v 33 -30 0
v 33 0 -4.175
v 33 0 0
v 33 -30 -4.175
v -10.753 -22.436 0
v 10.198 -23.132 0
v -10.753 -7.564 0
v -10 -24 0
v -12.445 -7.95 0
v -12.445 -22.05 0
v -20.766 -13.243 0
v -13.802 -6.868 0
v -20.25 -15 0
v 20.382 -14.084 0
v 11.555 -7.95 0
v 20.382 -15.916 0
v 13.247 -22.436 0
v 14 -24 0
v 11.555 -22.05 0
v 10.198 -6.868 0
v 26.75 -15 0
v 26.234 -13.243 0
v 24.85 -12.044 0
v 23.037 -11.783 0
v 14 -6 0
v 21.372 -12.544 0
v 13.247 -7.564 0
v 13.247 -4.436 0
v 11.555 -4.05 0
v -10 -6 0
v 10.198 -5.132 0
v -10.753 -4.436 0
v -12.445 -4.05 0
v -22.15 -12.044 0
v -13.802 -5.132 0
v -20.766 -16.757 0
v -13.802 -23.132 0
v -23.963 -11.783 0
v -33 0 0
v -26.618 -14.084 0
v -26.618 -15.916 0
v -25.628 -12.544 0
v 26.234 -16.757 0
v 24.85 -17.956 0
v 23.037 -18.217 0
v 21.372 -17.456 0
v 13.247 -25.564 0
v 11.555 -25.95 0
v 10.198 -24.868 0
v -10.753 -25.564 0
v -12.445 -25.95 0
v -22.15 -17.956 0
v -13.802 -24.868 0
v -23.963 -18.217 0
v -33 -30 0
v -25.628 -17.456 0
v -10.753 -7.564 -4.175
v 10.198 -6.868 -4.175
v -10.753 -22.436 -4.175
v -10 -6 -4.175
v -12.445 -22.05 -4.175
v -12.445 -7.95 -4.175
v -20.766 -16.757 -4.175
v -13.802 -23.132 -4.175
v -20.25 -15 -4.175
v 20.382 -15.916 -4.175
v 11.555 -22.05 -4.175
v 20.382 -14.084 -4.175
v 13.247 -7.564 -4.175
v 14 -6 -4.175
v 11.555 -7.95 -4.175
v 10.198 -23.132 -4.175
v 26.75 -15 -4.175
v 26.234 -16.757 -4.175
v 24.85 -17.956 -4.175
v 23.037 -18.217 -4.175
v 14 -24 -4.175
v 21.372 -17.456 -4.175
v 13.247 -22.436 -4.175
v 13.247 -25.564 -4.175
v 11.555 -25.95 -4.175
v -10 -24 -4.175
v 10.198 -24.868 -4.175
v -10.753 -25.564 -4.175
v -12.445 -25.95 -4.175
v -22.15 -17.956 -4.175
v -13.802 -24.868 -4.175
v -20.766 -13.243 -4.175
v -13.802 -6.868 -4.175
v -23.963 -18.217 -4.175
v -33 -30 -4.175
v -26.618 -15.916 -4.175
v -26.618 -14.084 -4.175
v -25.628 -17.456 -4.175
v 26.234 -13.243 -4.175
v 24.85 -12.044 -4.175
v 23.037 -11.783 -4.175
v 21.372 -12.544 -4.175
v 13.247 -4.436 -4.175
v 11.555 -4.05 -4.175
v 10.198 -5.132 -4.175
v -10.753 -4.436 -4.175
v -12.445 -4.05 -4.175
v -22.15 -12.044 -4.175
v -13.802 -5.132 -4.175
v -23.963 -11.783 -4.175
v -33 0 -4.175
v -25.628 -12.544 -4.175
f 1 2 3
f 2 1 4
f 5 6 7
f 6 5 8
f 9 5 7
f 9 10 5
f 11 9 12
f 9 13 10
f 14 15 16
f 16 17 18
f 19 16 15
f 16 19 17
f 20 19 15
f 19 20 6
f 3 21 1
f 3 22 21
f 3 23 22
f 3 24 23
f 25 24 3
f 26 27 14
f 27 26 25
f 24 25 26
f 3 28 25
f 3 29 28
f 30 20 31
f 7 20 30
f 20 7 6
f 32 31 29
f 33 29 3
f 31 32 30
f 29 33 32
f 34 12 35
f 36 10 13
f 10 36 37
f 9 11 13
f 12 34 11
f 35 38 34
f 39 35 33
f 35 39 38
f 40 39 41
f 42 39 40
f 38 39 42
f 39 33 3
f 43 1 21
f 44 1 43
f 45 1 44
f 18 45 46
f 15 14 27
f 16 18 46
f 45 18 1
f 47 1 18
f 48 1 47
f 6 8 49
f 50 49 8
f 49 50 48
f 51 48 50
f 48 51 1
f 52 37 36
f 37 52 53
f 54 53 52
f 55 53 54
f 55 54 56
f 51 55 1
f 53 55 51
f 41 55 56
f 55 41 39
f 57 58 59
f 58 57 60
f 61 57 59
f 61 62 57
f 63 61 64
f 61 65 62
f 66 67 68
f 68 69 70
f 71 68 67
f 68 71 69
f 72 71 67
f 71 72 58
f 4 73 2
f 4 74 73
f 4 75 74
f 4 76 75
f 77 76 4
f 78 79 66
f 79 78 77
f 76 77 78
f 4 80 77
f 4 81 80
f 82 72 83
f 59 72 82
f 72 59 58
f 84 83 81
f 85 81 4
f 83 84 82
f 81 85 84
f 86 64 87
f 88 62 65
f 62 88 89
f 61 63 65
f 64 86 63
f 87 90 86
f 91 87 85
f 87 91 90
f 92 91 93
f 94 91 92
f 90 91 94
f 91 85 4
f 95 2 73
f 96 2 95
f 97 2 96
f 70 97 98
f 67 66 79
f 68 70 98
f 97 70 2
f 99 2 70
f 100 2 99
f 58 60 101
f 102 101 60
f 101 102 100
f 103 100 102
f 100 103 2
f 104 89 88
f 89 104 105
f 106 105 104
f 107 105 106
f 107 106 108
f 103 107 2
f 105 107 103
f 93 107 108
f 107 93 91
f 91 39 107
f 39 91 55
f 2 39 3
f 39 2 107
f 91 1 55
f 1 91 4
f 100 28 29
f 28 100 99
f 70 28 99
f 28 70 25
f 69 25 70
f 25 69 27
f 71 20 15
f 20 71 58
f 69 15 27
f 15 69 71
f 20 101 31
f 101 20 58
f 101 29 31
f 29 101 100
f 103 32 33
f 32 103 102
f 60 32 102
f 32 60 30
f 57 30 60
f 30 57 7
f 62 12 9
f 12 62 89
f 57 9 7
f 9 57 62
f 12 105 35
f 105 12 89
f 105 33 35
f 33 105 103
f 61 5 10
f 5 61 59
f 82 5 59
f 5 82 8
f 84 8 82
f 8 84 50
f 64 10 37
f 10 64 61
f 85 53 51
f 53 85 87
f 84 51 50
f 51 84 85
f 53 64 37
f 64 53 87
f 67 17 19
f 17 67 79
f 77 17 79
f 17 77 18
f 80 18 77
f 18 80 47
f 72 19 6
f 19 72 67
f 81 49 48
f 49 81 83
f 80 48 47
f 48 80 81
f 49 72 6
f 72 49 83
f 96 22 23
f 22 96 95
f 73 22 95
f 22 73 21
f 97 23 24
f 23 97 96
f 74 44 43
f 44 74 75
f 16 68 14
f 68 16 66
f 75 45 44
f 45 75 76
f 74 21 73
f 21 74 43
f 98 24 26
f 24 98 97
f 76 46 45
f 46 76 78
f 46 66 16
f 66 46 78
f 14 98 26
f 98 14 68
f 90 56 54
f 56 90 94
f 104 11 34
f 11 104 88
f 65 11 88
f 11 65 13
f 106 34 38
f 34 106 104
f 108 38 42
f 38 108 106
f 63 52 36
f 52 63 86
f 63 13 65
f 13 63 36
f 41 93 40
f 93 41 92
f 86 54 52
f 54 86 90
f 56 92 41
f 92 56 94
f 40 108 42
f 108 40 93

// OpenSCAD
tplate = 25.4/8+1;

ls1 = 24;                       // X distance between mounting screws
ls2 = 18;                       // Y distance between mounting screws

l1 = ls1 + 42;                  // plate X dimension
l2 = ls2 + 12;                  // plate Y dimension

dscrew = 4;                // mounting screw diameter
dscrew2 = 6.5;                  // 3030 mounting screw diameter

l3 = 17 + dscrew2;

bushplate();

module bushplate(){
    translate ([0,-l2/2,-tplate/2]) difference ()
    {
        cube([l1,l2,tplate], center = true);
        // mounting screw holes
        translate ([+ls1/2,+ls2/2,0]) cylinder(d=dscrew, h=100, center = true);
        translate ([-ls1/2,+ls2/2,0]) cylinder(d=dscrew, h=100, center = true);
        translate ([-ls1/2,-ls2/2,0]) cylinder(d=dscrew, h=100, center = true);
        translate ([+ls1/2,-ls2/2,0]) cylinder(d=dscrew, h=100, center = true);
        // 3030 M6 screw holes
        translate ([+l3,0,0]) cylinder(d=dscrew2, h=100, center = true);
        translate ([-l3,0,0]) cylinder(d=dscrew2, h=100, center = true);
    }
}
